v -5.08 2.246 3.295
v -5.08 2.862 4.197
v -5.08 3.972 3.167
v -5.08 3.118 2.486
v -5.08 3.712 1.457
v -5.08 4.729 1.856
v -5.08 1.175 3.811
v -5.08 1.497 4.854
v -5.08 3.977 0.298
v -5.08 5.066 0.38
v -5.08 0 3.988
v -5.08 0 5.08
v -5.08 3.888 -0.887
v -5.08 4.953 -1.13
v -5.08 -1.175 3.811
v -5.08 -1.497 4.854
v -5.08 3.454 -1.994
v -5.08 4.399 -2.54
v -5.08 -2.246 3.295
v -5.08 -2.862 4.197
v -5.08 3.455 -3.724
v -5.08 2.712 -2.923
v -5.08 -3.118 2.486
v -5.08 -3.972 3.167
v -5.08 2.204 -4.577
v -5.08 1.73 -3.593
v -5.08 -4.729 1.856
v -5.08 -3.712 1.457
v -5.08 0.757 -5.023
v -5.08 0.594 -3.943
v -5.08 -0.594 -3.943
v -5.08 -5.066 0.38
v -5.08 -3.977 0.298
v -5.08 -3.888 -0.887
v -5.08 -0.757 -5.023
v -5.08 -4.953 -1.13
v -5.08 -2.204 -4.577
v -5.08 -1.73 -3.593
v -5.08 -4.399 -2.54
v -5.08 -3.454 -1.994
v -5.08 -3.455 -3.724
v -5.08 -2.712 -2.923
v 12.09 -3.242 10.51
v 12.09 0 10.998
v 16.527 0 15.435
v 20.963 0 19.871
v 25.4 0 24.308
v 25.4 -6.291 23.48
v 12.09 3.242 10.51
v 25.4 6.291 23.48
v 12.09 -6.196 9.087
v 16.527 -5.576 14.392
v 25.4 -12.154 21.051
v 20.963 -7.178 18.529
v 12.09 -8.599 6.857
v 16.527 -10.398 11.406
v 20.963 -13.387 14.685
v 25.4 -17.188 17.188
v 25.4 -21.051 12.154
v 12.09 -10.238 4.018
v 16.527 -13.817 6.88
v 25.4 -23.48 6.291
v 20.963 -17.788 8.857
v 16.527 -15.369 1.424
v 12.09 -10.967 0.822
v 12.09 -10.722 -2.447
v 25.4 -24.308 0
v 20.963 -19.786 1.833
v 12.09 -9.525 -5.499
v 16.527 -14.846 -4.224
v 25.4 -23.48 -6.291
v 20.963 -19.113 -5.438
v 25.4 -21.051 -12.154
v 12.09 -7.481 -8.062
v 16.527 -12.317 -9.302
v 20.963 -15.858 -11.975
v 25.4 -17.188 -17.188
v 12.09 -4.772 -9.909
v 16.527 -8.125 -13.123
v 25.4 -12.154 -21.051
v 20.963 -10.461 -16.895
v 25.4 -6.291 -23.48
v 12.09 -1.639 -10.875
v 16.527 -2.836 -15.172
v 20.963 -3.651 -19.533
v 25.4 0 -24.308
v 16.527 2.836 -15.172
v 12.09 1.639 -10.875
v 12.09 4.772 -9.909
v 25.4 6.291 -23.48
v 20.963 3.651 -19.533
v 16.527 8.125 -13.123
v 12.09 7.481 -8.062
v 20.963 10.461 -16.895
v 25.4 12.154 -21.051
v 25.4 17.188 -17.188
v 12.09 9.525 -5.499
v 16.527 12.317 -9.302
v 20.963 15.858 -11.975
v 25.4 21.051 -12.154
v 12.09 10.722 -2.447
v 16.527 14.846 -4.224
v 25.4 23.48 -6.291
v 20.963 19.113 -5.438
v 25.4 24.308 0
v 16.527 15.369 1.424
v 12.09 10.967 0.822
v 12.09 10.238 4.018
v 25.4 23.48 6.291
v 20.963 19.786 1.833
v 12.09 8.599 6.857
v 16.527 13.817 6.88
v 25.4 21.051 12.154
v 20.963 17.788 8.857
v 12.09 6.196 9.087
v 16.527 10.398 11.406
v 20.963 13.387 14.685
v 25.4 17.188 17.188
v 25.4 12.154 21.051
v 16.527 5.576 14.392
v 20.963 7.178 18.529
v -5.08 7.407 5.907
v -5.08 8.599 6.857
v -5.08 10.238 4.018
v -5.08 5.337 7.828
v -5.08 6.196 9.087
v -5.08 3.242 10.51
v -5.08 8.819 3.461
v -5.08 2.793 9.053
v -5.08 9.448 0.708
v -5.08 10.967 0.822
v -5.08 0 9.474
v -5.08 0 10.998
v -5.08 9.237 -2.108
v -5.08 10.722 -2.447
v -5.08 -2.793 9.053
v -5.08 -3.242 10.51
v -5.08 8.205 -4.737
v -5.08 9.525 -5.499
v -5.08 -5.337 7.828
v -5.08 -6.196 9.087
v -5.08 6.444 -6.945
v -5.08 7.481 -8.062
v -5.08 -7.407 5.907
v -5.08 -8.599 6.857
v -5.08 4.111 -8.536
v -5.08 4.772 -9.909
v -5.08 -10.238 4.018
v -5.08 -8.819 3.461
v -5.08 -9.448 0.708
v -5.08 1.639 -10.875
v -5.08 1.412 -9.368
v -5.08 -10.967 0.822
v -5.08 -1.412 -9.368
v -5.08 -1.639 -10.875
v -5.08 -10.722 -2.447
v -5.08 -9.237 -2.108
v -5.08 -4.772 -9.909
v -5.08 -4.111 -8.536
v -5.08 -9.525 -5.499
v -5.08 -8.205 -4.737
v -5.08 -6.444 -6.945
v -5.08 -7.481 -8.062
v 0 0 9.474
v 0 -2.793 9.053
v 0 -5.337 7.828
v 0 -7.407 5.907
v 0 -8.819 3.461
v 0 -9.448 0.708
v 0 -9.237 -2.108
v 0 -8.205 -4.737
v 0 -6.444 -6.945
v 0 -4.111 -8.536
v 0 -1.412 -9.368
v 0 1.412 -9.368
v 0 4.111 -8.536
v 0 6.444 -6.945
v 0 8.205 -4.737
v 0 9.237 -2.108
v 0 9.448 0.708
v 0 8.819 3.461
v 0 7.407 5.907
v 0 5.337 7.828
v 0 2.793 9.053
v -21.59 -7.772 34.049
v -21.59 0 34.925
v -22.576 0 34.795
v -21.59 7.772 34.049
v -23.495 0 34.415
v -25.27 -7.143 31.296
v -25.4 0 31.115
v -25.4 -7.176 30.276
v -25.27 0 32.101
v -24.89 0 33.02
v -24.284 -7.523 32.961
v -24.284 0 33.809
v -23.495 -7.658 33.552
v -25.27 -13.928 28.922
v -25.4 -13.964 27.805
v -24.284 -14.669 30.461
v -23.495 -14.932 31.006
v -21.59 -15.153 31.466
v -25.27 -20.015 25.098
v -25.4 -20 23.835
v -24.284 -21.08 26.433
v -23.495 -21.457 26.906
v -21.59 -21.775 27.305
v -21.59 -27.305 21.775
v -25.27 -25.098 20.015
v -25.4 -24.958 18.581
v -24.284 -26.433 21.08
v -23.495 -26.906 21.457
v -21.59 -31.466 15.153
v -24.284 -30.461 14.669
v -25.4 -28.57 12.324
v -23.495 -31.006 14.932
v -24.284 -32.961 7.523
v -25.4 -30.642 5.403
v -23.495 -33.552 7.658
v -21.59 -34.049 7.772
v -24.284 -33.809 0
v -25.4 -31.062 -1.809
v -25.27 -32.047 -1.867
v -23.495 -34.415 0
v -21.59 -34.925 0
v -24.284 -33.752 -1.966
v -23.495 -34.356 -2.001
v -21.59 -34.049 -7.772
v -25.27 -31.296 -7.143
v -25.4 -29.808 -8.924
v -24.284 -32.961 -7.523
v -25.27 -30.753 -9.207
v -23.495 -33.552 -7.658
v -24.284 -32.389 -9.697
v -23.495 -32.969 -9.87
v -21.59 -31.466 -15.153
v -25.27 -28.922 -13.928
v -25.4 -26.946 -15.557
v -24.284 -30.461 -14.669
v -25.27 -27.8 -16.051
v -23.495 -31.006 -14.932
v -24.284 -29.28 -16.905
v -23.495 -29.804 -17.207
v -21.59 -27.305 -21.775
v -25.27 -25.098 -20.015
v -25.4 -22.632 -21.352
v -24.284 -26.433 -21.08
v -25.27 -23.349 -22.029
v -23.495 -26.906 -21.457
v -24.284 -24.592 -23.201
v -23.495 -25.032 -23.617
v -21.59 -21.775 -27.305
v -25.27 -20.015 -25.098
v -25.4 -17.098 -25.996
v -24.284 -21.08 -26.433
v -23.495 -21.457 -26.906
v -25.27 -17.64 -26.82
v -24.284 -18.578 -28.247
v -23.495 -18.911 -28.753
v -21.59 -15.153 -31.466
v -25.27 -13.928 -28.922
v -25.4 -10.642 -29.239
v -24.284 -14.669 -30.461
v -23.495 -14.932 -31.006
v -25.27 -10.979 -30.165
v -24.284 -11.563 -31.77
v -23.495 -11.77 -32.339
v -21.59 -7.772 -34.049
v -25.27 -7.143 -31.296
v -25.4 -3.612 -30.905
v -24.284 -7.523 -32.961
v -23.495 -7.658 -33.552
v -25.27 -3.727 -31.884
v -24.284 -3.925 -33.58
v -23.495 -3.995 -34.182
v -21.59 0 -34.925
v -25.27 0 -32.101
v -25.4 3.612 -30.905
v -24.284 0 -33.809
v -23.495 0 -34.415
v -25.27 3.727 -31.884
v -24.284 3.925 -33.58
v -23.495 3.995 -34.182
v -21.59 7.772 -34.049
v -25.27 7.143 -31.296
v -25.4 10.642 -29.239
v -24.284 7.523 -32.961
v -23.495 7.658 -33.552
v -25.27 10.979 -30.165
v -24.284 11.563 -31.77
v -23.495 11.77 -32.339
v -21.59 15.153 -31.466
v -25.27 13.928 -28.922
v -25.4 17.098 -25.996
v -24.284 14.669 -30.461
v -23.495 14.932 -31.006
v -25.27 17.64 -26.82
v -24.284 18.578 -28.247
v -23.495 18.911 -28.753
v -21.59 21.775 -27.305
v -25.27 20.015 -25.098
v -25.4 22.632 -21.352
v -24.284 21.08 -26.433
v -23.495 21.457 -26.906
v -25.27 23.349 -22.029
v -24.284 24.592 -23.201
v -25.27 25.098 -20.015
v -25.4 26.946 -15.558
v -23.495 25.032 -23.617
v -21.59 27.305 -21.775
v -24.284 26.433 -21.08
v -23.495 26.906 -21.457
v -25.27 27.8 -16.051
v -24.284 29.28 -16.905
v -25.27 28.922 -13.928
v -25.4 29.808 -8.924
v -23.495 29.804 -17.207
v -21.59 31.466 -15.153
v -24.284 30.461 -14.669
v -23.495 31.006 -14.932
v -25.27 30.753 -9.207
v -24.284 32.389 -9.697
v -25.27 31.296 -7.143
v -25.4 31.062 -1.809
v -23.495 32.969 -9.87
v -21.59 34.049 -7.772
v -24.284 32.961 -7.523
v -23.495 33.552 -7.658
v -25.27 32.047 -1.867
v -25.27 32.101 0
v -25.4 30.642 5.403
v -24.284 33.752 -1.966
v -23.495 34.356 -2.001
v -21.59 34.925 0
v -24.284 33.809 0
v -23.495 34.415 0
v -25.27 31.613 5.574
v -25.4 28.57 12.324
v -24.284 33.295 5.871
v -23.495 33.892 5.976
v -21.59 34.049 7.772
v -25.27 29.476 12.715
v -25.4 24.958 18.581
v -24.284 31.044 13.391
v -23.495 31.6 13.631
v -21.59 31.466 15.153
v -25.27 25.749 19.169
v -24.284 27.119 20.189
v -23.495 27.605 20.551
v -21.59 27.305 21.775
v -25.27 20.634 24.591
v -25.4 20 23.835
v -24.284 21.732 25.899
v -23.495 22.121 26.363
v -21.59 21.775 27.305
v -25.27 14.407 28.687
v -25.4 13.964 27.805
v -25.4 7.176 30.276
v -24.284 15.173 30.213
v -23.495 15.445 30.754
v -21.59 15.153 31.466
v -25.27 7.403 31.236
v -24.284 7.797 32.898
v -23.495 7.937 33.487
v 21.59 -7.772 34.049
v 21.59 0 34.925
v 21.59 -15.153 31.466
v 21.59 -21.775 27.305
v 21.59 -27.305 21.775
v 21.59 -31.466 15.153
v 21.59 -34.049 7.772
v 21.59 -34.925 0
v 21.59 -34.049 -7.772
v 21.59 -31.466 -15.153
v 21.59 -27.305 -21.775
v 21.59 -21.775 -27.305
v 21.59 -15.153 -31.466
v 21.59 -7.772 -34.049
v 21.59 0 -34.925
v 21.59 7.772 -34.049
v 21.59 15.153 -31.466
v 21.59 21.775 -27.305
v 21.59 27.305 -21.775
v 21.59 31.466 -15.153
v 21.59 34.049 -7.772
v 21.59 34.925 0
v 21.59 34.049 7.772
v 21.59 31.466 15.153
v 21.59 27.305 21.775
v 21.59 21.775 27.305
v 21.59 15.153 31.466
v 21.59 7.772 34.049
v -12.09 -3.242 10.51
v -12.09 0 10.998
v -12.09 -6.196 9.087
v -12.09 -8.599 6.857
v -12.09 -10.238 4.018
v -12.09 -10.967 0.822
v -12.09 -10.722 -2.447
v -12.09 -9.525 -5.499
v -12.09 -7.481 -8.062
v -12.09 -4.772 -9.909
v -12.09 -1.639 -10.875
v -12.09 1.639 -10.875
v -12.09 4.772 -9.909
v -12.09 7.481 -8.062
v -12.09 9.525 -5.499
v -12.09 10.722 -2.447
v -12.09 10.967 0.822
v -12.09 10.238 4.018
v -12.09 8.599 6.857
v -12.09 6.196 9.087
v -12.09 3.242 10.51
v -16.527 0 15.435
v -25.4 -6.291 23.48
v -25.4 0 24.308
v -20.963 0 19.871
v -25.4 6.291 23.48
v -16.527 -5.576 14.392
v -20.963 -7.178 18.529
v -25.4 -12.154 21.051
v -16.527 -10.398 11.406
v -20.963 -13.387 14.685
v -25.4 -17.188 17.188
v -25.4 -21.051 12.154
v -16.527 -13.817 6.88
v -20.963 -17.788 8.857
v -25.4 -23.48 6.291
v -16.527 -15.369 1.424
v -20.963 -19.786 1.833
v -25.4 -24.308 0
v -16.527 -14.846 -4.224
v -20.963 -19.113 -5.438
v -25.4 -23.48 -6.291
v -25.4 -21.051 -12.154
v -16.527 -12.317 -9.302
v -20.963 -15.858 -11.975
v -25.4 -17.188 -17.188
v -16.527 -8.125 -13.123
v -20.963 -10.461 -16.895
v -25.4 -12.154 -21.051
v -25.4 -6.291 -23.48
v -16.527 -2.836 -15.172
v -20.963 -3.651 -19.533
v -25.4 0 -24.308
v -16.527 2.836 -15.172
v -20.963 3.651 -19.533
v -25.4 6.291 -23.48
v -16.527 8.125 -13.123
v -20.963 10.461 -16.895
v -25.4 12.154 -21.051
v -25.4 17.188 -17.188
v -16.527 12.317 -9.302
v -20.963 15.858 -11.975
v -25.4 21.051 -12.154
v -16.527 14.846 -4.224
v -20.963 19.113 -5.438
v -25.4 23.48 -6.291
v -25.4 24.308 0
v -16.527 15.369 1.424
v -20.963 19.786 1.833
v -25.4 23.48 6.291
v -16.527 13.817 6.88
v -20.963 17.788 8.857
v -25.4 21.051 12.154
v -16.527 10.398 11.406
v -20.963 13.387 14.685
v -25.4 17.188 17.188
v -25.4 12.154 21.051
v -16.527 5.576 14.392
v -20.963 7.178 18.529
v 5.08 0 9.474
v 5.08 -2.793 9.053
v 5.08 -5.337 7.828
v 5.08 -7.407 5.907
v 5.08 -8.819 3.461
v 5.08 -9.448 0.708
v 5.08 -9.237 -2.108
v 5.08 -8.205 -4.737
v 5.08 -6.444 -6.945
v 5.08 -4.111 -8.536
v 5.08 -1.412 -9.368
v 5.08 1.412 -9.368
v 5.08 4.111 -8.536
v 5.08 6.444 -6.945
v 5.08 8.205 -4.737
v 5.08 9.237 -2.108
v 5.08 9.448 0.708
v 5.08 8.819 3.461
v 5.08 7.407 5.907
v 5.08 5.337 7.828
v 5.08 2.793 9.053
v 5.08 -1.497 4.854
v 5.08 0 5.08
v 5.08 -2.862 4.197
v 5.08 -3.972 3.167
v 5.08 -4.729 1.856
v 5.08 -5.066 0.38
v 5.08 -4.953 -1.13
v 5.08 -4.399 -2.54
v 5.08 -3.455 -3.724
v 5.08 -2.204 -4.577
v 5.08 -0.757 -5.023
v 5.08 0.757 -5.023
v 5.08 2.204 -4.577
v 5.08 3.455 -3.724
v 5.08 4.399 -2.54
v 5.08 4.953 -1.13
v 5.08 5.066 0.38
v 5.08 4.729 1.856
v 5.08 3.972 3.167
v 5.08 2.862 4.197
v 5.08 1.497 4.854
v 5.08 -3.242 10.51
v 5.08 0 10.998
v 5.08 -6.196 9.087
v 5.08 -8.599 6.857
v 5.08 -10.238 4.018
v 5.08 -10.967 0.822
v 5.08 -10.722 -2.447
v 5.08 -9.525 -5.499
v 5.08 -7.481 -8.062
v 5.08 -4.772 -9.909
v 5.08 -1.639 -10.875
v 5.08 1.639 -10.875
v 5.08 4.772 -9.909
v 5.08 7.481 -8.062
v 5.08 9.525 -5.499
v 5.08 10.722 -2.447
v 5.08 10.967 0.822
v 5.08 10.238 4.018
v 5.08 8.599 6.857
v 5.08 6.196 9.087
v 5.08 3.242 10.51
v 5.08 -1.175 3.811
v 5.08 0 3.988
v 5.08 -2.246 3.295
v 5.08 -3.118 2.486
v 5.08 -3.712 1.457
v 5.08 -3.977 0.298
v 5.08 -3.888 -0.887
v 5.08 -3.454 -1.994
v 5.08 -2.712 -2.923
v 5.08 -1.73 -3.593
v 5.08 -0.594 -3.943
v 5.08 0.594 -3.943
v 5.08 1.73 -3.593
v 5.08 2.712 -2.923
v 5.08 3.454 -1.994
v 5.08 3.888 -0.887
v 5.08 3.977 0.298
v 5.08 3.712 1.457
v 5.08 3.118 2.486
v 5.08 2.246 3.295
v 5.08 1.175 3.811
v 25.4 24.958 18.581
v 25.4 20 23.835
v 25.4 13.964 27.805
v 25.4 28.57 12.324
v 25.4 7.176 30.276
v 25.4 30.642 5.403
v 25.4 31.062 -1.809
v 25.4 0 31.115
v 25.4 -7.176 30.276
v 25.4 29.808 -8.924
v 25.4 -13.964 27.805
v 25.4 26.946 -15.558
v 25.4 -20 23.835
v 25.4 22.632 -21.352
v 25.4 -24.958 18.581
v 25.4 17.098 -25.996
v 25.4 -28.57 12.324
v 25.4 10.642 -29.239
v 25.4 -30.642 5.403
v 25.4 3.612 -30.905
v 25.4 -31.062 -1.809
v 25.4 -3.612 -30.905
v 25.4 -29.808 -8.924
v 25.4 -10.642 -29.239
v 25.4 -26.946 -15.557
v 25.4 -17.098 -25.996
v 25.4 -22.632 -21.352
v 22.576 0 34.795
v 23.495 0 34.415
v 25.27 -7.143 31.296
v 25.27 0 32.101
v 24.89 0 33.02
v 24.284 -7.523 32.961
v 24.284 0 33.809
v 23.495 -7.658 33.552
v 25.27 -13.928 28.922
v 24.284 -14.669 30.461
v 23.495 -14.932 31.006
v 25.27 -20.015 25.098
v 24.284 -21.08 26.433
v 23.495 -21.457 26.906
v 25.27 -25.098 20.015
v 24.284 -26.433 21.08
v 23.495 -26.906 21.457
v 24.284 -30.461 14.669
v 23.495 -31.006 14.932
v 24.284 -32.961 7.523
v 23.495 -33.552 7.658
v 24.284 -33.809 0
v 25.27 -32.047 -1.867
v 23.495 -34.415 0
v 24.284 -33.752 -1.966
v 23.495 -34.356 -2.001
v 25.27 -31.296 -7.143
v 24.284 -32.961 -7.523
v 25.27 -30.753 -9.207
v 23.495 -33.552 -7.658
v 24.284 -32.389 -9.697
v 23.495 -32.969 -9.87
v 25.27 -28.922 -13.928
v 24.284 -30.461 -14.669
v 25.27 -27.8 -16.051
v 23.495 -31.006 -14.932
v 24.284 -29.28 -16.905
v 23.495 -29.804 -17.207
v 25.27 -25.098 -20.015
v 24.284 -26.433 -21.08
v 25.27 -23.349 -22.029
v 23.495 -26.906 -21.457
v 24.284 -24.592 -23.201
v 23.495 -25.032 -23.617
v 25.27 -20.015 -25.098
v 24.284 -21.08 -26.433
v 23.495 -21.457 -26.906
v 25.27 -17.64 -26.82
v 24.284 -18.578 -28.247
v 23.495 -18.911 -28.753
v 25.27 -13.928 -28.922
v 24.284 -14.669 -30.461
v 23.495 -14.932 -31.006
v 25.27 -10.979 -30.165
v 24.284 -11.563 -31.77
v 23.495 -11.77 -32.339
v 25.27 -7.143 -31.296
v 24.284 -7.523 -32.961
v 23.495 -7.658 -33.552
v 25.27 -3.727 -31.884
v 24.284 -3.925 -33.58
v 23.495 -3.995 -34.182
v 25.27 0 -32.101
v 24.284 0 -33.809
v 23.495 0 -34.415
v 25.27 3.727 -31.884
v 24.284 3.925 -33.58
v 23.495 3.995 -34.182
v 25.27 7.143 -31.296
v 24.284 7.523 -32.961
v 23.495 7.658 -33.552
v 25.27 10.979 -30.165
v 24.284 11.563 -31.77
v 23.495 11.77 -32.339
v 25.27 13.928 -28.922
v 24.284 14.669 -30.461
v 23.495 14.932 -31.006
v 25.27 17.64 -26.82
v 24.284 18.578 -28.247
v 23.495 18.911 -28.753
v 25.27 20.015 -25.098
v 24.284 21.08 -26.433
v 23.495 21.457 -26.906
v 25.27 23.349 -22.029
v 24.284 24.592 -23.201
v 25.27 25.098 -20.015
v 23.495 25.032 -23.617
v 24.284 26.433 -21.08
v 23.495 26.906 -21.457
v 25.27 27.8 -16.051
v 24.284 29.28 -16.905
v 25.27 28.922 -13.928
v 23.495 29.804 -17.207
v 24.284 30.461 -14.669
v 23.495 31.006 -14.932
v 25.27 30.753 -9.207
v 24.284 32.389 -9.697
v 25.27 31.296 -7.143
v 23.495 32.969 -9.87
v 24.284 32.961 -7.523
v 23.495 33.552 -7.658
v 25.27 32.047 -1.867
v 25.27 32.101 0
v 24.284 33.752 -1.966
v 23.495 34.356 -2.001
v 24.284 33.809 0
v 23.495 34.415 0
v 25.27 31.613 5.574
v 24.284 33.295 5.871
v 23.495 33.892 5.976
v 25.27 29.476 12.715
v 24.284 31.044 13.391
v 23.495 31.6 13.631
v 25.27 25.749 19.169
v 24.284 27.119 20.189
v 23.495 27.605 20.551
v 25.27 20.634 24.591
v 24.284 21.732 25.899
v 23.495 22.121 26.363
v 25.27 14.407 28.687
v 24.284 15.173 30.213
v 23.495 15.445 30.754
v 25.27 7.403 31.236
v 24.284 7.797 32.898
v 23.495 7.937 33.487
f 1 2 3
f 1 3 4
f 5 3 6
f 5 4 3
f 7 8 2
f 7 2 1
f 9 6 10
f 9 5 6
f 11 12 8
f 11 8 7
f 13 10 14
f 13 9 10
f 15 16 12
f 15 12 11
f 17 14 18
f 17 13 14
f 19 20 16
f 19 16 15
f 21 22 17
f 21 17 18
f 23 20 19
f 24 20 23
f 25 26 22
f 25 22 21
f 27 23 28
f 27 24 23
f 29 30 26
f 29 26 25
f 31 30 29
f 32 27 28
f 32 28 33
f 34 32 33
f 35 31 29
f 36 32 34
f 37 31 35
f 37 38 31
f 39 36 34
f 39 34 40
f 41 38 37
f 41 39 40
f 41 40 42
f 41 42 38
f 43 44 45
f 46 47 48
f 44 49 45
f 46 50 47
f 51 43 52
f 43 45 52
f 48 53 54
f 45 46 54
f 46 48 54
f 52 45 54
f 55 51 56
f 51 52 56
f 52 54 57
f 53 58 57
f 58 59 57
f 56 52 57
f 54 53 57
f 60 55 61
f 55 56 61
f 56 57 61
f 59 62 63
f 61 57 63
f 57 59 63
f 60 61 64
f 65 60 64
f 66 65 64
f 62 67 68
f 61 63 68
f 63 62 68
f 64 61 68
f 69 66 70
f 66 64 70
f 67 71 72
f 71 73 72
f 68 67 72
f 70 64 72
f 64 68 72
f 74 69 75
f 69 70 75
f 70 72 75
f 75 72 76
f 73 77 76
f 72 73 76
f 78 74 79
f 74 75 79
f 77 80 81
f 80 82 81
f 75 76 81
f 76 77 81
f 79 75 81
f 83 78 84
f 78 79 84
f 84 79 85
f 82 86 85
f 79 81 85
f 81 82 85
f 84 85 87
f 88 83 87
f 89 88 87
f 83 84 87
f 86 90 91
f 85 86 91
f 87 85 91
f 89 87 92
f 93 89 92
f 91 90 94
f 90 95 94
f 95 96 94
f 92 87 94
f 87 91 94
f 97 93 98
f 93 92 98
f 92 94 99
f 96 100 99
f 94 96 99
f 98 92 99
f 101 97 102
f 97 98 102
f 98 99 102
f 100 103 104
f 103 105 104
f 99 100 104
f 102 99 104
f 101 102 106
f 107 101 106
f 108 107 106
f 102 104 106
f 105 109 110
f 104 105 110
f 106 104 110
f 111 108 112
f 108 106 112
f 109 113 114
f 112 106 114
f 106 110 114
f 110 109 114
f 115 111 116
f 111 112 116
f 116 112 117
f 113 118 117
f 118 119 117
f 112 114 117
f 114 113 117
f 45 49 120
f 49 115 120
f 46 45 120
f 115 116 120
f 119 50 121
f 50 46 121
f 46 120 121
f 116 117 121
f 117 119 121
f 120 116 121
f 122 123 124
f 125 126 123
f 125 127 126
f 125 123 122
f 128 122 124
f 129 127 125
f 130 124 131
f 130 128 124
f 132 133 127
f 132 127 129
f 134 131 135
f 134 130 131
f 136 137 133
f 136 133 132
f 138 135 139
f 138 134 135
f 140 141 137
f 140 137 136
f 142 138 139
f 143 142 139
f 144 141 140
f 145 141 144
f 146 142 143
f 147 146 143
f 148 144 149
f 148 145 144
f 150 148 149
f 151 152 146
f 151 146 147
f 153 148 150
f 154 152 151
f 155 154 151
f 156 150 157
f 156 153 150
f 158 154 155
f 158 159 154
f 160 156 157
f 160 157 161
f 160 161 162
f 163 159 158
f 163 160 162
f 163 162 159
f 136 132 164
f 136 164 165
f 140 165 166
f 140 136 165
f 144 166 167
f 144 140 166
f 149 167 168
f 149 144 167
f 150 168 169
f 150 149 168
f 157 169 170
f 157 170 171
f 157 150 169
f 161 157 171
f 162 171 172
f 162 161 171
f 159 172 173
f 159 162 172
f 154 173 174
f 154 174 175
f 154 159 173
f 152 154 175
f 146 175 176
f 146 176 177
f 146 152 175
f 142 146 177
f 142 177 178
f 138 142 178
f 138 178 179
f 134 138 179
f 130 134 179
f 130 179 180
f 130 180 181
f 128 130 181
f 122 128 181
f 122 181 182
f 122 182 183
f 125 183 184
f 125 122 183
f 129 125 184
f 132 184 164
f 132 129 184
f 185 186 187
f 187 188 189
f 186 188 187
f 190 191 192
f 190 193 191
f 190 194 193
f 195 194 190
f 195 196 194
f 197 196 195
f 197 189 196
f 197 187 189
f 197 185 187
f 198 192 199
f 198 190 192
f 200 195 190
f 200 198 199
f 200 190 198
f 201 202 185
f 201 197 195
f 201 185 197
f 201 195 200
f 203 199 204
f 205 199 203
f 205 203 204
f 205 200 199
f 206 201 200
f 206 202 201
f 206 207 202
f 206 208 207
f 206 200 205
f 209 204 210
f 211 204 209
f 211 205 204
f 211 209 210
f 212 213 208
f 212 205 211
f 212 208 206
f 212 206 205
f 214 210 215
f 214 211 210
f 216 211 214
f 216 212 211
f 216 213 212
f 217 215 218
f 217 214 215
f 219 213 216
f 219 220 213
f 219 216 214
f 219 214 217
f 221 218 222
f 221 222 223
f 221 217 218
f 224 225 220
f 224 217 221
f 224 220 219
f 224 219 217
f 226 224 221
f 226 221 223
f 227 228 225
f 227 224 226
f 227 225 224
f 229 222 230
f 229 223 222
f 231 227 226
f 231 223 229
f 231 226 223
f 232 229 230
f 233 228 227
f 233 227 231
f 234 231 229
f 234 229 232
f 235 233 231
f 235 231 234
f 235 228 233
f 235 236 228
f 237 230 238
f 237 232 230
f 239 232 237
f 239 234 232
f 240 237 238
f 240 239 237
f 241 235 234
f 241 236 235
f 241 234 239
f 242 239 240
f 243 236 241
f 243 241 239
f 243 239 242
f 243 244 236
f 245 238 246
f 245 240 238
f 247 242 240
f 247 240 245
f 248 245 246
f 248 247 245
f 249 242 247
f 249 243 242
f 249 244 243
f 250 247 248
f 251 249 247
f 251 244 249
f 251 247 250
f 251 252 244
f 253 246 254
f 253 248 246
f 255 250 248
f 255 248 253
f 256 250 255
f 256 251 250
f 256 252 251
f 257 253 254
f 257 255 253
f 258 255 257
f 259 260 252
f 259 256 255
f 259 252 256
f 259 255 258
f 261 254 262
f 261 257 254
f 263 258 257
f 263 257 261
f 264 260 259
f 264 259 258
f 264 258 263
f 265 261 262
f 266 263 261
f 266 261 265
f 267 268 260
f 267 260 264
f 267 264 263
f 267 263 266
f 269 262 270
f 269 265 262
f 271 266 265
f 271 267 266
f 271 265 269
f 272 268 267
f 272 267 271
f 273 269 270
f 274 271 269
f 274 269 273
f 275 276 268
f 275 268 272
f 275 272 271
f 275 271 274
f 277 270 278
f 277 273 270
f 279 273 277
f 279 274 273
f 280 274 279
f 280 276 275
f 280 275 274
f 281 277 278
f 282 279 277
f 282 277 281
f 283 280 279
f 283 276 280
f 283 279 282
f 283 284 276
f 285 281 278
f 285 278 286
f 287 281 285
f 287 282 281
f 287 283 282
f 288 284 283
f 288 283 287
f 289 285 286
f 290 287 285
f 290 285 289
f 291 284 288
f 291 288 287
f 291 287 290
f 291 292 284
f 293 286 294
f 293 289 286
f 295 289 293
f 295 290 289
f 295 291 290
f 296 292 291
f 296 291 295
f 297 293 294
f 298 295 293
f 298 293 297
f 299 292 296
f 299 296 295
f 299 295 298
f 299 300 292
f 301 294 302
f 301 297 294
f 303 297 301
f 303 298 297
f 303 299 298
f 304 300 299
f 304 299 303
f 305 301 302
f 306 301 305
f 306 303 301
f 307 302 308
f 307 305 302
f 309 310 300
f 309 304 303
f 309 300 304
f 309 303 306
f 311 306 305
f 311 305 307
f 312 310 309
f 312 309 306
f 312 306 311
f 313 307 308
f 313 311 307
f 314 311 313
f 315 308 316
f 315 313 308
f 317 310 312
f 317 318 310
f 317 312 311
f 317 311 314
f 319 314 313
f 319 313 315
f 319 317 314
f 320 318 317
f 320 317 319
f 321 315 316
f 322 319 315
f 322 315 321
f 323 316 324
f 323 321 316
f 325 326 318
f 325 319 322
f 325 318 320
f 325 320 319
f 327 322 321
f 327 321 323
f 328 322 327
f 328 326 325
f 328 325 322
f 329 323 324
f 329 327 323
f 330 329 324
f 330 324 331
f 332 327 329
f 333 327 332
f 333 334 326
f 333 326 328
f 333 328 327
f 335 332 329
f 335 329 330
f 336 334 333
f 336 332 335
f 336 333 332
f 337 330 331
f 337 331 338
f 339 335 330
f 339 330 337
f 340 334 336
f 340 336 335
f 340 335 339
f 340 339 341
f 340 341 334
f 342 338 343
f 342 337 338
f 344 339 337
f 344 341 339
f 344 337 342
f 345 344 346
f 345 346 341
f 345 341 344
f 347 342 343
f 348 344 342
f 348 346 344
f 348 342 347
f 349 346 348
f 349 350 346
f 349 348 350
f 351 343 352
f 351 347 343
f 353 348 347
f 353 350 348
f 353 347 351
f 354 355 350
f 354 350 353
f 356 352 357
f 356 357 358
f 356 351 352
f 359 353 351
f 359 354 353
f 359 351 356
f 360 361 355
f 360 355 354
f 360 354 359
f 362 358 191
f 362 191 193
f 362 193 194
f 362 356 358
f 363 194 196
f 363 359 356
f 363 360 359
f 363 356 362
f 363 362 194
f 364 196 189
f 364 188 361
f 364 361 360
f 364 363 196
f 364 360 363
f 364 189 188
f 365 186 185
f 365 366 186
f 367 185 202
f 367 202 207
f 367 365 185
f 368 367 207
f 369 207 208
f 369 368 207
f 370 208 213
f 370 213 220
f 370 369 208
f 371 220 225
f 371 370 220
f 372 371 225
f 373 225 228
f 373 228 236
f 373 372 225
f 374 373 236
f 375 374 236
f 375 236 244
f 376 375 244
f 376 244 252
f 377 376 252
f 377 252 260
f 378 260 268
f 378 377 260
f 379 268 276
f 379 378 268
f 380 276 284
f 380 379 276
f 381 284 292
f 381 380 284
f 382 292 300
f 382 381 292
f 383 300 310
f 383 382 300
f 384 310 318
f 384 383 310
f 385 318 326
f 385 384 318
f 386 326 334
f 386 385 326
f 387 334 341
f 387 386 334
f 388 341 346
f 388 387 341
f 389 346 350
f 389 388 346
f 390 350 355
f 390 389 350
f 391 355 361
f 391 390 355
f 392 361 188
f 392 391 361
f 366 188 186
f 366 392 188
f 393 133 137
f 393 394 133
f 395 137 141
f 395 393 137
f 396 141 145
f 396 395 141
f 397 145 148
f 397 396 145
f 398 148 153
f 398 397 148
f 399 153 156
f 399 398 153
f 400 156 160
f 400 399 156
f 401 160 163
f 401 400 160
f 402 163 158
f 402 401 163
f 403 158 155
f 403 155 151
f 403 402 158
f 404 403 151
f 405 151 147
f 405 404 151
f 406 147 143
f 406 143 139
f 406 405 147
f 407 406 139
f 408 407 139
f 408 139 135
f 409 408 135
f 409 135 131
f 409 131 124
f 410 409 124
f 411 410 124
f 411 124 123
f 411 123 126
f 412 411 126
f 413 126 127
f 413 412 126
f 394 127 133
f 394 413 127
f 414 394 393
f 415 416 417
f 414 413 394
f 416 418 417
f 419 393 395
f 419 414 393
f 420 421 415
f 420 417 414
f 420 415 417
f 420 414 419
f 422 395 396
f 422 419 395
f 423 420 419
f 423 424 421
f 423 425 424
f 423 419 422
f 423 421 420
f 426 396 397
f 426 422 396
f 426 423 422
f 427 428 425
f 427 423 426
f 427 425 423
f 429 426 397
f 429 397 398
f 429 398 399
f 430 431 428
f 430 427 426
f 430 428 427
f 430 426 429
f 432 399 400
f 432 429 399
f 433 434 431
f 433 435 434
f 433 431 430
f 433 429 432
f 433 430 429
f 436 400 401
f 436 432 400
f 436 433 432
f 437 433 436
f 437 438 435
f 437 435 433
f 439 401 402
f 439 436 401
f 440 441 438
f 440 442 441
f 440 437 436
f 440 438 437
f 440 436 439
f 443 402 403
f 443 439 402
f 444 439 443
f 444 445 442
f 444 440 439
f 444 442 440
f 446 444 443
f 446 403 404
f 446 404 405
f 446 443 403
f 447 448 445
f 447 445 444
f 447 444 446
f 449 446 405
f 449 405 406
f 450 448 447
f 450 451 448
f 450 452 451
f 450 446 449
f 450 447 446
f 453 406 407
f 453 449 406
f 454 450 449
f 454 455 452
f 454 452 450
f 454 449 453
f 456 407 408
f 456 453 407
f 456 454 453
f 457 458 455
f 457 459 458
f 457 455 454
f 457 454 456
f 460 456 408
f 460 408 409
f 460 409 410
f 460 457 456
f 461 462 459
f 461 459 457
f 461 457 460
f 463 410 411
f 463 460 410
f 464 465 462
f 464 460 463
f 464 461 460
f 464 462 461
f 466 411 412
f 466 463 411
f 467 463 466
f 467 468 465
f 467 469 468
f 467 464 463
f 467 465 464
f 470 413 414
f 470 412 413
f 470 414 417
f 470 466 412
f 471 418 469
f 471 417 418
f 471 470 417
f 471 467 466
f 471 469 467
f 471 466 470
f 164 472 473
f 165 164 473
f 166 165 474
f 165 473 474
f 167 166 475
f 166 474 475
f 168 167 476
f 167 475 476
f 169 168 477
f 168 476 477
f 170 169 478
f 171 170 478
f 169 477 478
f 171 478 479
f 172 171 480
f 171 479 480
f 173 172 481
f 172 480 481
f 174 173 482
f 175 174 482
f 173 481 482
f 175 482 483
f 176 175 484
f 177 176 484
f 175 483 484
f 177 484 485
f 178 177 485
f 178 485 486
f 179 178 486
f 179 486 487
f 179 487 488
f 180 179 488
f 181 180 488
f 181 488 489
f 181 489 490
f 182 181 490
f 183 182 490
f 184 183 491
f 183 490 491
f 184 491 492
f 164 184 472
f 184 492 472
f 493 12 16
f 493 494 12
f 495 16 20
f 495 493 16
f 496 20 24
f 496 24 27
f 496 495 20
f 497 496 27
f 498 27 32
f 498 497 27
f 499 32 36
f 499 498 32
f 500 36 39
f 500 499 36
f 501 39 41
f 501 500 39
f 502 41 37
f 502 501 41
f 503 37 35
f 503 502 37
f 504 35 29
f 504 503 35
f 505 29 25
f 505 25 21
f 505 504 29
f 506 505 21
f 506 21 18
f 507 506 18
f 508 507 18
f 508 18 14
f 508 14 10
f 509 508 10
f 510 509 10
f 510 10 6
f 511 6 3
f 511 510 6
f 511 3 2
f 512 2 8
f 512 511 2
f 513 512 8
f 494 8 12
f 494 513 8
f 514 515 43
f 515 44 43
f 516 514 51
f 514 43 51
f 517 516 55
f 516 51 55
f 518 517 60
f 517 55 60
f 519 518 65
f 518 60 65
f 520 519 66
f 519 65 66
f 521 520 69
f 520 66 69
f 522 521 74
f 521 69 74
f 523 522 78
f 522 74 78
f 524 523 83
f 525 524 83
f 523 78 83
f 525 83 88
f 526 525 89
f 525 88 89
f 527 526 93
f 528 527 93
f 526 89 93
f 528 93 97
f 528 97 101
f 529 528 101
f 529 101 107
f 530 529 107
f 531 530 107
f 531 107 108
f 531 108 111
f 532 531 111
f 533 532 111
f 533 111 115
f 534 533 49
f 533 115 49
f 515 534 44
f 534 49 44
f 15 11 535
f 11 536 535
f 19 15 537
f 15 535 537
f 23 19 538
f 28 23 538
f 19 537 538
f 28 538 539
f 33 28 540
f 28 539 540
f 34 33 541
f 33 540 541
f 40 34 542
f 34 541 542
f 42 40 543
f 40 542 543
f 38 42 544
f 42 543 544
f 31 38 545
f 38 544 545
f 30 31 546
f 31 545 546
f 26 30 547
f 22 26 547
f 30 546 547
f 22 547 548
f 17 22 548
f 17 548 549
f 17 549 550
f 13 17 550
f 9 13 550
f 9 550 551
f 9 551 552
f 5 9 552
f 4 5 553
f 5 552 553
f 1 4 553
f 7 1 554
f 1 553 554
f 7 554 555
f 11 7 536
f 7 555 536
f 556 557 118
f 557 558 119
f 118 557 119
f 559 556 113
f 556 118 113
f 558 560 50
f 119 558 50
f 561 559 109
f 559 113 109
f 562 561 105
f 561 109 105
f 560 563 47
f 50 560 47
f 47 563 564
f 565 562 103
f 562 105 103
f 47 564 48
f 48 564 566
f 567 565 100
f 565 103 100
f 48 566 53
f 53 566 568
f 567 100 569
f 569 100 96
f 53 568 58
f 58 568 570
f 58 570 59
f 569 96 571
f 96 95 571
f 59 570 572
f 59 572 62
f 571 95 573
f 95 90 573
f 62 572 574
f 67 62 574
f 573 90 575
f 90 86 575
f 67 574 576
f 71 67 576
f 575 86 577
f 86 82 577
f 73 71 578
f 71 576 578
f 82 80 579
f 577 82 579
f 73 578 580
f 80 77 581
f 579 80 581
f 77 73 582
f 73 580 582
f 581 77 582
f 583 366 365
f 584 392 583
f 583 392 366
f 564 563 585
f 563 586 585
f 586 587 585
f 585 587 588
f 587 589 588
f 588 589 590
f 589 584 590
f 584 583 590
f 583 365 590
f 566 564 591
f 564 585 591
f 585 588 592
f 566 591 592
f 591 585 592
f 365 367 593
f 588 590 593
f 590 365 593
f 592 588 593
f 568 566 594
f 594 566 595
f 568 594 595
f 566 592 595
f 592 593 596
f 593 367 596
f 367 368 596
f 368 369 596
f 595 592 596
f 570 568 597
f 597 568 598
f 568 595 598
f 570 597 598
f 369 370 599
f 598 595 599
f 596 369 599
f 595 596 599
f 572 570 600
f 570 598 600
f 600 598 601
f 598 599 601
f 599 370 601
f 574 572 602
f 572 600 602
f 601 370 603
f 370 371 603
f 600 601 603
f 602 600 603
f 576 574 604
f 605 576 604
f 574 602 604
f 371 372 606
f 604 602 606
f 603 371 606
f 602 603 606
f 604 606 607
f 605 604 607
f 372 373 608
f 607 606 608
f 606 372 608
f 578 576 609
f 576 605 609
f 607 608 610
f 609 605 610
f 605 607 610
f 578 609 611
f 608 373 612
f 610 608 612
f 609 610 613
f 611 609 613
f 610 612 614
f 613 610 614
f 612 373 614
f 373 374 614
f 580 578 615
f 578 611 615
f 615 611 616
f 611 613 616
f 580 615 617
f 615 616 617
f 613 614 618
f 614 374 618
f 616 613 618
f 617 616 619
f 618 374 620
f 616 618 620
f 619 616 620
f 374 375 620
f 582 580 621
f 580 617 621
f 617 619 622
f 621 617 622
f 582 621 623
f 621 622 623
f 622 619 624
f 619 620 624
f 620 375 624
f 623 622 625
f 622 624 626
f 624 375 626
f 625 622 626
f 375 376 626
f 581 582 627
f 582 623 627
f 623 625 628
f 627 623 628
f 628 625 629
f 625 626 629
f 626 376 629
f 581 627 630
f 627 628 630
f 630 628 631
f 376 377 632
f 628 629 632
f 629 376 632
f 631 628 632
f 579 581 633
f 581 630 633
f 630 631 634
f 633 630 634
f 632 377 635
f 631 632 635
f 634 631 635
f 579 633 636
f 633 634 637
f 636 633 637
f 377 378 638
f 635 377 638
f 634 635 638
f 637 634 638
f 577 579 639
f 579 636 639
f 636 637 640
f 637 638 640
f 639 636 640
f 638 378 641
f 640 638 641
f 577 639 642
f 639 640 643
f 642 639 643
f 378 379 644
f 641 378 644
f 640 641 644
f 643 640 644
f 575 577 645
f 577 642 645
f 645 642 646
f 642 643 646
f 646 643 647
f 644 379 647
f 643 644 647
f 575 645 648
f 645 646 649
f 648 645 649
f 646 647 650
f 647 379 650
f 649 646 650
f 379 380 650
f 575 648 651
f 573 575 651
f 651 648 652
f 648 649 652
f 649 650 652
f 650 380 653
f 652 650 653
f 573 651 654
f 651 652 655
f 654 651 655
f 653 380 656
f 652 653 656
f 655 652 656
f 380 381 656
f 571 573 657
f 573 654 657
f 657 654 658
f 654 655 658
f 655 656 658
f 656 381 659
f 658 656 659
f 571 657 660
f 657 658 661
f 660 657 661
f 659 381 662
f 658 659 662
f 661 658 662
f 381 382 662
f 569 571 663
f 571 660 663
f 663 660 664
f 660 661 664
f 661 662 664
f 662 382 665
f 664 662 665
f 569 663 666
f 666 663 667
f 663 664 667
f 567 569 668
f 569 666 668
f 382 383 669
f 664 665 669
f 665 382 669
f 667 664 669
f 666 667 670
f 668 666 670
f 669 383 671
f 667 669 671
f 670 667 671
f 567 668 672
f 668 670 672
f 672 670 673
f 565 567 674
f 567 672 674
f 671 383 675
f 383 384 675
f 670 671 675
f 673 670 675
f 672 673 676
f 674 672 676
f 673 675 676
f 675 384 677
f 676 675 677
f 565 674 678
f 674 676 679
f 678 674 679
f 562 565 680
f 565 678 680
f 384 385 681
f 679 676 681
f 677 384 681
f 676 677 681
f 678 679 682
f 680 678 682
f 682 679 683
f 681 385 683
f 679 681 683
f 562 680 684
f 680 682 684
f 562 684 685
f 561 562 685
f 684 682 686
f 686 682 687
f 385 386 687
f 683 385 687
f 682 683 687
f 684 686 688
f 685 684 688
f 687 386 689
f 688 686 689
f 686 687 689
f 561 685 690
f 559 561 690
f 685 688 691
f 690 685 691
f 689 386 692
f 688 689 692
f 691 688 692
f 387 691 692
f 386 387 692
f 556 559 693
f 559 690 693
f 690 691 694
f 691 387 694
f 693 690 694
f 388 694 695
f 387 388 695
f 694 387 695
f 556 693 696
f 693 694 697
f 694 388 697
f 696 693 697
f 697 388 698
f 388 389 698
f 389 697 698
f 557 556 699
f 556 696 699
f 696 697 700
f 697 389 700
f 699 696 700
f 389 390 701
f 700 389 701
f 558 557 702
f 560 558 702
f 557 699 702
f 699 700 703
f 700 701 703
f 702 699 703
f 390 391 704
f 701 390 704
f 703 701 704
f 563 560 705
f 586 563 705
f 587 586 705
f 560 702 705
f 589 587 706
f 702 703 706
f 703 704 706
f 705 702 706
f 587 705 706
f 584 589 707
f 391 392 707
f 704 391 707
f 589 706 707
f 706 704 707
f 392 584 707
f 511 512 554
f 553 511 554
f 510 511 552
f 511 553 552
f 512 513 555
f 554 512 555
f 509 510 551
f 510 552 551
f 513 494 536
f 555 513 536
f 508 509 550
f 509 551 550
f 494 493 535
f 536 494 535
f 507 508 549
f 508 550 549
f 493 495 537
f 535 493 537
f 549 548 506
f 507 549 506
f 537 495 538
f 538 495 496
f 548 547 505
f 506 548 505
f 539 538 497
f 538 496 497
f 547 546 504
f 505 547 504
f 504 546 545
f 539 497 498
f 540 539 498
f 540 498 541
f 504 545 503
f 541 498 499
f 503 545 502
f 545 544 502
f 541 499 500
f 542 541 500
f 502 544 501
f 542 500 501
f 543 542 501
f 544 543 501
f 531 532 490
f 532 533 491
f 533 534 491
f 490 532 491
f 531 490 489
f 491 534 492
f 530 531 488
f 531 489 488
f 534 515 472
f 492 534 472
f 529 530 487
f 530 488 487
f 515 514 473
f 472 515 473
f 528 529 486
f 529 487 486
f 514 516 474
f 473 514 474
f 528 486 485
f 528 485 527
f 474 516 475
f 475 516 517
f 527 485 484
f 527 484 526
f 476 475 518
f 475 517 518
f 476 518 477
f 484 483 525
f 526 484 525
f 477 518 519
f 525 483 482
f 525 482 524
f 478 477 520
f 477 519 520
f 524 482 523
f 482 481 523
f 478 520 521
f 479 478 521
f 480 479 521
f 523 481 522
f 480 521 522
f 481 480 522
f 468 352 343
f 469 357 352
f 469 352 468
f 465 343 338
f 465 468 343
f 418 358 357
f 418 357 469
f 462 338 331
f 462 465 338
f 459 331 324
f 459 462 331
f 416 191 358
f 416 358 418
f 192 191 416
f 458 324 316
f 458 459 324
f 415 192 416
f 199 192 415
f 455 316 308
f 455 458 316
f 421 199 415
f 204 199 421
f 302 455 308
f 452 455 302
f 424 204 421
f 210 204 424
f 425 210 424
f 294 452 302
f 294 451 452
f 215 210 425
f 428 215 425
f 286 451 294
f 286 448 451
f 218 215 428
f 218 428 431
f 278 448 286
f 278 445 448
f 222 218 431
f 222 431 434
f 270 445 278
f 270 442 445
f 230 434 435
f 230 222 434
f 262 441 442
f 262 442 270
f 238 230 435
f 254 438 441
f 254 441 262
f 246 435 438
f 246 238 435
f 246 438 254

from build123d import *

# Parameters (mm, degrees)
F3_W = 10.16
F3_H = 1.0922


with BuildPart() as f1:
    # F0 (on Front) → F1 (revolve)
    with BuildSketch(Plane.XZ):
        with BuildLine():
            Line((21.59, 34.925), (0, 34.925))
            Line((0, 34.925), (0, 9.4742))
            Line((0, 9.4742), (5.08, 9.4742))
            Line((5.08, 9.4742), (5.08, 10.9982))
            Line((5.08, 10.9982), (12.0904, 10.9982))
            Line((12.0904, 10.9982), (25.4, 24.3078))
            Line((25.4, 24.3078), (25.4, 31.115))
            ThreePointArc((25.4, 31.115), (24.284077, 33.809077), (21.59, 34.925))
        make_face()
    revolve(axis=Axis((8.604228, 0, 0), (1, 0, 0)))

    # F2: F1 across plane


with BuildPart() as f1_1:
    add(f1.part)
    add(f1.part.mirror(Plane.YZ))


with BuildPart() as f4:
    # F3 (on Front) → F4 (revolve)
    with BuildSketch(Plane.XZ):
        with Locations((0, 4.5339)):
            Rectangle(F3_W, F3_H)
    revolve(axis=Axis((8.604228, 0, 0), (1, 0, 0)))


solid = Compound([f1_1.part, f4.part])
